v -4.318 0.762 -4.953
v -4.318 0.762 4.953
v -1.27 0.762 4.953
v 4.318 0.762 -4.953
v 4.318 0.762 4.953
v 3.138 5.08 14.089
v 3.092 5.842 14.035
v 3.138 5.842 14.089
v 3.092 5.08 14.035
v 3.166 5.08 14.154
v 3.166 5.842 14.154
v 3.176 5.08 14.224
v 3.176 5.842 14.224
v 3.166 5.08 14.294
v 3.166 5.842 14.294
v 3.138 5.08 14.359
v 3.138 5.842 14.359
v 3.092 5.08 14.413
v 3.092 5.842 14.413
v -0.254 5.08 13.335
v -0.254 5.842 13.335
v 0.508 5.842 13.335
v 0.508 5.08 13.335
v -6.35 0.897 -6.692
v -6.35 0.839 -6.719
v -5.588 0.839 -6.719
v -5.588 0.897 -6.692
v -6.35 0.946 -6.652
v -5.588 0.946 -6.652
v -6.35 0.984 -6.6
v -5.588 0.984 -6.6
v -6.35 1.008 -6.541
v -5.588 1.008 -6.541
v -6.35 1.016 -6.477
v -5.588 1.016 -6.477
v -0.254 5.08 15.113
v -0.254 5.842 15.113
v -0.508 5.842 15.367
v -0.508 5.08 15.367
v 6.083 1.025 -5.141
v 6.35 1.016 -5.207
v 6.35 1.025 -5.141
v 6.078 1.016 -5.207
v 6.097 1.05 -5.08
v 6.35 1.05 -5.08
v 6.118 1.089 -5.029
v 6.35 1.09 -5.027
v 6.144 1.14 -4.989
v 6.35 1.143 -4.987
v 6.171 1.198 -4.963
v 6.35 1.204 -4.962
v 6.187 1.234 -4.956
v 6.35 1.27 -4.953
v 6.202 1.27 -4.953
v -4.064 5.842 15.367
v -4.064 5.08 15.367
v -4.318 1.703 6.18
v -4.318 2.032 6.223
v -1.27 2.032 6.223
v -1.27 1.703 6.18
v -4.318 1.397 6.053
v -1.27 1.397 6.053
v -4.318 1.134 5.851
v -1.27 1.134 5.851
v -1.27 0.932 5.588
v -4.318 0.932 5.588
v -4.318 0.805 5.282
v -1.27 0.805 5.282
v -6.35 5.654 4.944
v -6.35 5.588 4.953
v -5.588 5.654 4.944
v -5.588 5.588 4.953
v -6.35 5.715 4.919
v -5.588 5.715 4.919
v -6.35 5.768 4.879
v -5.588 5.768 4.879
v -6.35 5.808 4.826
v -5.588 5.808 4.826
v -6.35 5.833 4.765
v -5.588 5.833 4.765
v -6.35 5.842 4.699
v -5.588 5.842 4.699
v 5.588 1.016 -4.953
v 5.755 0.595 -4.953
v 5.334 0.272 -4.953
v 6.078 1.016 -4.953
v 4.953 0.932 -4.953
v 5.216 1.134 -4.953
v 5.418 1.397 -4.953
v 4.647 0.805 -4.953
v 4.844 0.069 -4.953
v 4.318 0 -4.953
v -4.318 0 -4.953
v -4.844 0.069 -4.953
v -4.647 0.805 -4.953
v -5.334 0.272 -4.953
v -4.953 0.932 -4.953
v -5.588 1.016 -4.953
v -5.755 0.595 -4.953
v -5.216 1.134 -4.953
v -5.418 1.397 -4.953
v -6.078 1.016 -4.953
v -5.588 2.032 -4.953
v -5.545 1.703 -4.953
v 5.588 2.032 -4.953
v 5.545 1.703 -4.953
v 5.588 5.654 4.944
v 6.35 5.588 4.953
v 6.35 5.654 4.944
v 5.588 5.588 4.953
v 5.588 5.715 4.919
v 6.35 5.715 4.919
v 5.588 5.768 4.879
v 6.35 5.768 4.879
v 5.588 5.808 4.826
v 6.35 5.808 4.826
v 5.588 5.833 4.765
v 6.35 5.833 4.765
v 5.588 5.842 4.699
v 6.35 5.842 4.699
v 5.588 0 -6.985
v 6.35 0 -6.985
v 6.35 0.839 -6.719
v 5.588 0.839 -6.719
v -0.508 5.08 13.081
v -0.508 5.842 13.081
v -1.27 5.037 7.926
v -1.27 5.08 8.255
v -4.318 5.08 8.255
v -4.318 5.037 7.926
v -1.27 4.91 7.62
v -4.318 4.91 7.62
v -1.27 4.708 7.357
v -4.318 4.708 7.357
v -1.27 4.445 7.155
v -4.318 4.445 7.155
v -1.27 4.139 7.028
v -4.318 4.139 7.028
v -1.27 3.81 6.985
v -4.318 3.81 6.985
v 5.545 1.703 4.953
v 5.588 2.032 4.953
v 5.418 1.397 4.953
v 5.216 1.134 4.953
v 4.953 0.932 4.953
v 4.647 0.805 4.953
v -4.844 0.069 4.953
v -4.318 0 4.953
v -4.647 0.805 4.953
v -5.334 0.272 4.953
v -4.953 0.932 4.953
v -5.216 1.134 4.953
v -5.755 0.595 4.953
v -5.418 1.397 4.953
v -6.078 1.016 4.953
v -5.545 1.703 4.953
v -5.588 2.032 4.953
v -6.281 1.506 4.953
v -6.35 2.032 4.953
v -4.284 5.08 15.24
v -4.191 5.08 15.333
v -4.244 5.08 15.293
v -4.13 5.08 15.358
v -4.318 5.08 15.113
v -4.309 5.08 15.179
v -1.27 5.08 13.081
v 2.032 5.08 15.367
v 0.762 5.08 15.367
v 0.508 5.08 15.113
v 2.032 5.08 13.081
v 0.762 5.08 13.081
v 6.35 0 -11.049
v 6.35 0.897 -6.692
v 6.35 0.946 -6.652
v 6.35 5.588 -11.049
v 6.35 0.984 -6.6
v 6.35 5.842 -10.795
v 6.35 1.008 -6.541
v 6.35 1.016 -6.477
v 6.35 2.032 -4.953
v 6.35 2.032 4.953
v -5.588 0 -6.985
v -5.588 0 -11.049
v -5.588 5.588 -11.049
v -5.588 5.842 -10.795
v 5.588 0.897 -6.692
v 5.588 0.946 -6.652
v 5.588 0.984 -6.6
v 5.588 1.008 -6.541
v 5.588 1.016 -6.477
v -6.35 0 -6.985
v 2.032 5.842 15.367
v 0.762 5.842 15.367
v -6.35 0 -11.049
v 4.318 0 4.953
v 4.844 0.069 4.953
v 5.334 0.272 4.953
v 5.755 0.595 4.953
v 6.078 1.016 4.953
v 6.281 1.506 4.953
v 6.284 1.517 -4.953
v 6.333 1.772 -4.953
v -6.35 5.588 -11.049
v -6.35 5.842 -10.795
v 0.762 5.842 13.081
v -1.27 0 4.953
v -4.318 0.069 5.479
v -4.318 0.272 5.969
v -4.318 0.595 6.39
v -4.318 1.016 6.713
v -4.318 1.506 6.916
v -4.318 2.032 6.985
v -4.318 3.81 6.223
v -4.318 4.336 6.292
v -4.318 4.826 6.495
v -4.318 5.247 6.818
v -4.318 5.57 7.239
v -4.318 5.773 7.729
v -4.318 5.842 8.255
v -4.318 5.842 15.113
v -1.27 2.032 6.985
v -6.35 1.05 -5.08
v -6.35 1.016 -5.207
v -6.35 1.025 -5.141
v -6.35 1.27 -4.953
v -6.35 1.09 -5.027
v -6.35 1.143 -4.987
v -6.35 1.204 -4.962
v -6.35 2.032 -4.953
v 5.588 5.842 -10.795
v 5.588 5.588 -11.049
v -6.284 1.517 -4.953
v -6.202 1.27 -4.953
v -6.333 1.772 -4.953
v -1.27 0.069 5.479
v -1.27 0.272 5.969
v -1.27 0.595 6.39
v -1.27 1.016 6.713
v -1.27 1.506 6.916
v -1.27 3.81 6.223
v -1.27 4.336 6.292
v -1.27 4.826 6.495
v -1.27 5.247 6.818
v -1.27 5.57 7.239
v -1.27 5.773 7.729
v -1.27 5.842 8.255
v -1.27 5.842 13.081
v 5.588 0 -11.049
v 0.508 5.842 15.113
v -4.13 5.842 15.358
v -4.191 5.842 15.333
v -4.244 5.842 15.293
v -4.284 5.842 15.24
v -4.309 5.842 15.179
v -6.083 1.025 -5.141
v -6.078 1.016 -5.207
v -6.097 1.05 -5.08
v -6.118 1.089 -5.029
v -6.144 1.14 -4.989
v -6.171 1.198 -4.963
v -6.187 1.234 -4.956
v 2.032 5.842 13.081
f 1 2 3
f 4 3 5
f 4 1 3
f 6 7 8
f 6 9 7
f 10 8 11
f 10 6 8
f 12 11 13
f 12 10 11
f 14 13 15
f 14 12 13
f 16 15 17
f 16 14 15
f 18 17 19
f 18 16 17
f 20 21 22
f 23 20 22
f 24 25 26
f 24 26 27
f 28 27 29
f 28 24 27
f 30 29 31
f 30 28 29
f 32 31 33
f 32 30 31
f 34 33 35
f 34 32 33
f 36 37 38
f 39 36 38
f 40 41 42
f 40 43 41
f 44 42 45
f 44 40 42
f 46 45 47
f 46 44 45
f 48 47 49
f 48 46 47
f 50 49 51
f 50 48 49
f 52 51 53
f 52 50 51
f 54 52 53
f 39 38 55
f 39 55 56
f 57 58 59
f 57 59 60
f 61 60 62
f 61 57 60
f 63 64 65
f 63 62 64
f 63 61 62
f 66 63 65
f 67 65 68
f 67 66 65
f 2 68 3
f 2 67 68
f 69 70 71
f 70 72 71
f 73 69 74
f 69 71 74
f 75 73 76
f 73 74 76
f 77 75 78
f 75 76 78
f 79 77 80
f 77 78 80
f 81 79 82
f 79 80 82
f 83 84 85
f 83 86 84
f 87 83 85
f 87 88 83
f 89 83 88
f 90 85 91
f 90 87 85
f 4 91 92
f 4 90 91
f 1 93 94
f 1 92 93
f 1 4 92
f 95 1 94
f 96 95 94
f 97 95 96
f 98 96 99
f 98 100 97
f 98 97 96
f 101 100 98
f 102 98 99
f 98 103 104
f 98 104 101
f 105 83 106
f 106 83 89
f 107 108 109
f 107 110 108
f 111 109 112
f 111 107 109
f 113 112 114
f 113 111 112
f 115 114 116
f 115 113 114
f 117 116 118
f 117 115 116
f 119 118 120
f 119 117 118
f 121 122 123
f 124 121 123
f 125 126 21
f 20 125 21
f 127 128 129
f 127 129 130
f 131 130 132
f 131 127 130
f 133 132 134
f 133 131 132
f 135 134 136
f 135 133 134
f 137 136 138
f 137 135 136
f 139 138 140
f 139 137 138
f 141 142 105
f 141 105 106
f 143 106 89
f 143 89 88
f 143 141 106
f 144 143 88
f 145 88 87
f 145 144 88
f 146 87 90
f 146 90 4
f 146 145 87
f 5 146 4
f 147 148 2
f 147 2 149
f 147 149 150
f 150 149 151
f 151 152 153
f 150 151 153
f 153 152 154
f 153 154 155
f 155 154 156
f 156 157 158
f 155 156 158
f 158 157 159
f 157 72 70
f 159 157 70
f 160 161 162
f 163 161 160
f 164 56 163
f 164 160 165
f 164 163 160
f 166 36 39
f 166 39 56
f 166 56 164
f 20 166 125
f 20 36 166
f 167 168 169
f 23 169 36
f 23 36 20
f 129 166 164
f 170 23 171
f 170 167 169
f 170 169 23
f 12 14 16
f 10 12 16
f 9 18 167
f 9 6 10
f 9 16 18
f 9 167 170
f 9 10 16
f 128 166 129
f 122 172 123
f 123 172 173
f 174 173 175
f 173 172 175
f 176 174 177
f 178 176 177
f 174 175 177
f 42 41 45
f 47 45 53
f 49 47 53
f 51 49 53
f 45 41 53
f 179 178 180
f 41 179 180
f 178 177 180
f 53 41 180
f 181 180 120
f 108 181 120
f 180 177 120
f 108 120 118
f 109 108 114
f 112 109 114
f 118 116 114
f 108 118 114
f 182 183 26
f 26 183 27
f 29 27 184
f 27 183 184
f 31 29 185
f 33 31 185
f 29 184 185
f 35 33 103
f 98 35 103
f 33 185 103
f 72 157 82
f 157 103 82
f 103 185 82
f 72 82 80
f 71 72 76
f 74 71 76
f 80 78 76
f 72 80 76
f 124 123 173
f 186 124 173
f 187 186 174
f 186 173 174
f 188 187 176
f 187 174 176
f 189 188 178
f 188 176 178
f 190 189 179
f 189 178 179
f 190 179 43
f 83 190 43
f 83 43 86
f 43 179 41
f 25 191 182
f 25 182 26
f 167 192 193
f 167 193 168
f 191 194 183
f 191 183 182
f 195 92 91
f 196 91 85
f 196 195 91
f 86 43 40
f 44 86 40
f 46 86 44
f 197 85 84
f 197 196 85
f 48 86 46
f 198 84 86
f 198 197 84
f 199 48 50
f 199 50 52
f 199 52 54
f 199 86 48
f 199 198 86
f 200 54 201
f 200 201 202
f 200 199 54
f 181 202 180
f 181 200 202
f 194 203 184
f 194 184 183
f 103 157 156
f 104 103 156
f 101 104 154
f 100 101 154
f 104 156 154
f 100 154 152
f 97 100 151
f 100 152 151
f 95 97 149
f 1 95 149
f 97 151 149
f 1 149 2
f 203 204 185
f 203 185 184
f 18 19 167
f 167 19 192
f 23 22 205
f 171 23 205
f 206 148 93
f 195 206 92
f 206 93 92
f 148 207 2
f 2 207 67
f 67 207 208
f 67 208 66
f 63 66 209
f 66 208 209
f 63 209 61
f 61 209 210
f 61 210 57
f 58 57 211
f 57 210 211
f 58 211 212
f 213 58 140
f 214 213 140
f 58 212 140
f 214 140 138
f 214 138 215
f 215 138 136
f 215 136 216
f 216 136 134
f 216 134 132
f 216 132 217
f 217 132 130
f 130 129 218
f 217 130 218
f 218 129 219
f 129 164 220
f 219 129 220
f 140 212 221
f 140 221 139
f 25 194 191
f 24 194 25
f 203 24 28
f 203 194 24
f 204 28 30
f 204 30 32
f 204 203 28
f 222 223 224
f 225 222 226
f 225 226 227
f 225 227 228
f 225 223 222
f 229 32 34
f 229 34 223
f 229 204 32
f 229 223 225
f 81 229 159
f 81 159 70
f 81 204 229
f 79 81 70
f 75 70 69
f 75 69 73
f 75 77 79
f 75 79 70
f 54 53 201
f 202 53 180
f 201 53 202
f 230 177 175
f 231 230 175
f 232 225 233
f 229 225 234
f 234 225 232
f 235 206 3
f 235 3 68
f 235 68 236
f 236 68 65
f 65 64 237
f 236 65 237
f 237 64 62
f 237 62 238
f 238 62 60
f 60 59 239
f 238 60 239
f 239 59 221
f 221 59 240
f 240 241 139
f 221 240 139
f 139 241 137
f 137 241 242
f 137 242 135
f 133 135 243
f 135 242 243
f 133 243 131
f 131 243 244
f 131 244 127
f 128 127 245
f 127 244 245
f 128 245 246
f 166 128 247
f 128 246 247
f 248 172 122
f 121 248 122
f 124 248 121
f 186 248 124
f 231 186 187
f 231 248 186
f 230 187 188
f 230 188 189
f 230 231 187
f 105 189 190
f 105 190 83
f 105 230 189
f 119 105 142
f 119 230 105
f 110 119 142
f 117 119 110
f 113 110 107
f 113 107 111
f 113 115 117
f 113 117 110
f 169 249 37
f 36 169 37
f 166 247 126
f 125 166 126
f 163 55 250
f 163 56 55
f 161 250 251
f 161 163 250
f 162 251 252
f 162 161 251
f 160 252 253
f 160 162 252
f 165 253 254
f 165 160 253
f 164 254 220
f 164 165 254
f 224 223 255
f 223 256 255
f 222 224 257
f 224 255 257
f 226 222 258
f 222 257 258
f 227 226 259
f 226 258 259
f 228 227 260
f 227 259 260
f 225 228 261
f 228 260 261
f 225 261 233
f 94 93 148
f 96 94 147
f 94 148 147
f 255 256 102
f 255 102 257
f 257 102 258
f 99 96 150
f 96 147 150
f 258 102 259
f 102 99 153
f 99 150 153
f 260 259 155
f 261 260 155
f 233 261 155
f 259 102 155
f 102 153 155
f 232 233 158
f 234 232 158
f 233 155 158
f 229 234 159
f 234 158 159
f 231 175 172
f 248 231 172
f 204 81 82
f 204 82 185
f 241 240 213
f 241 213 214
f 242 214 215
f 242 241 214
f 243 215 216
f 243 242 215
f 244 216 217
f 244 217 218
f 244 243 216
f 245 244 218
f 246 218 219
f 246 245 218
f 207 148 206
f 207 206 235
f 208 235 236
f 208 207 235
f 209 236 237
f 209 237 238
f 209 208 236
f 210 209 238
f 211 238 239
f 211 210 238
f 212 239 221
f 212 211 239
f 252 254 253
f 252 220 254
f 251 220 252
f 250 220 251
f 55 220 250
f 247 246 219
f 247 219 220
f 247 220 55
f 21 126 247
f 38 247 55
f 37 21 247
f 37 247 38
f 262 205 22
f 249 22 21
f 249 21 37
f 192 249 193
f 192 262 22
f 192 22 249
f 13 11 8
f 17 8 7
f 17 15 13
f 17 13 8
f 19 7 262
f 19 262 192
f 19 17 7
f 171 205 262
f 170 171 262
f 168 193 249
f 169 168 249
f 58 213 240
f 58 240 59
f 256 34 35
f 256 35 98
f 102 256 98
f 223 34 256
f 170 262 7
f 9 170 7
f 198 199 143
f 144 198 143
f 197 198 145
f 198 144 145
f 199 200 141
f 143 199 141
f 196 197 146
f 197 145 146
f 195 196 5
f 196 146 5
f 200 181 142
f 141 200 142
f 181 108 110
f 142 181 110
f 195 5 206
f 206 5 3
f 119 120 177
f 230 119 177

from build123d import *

# Parameters (mm, degrees)
SKETCH1_W                    = 12.7
SKETCH1_H                    = 9.906
BOSS_EXTRUDE1_DEPTH          = 0.762
EDGE_FLANGE1_STRIP_W         = 5.588
EDGE_FLANGE1_STRIP_H         = 0.762
EDGE_FLANGE1_STRIP_CUT_DEPTH = 9.906
EDGE_FLANGE1_DEPTH           = 9.906
TAB1_DEPTH                   = 0.762
EDGE_FLANGE2_DEPTH           = 8.636
EDGE_FLANGE3_STRIP_W         = 5.588
EDGE_FLANGE3_STRIP_H         = 0.762
EDGE_FLANGE3_STRIP_CUT_DEPTH = 8.636
EDGE_FLANGE3_DEPTH           = 8.636
CUT_EXTRUDE1_DEPTH           = 18.623738338
FILLET1_R                    = 0.254
FILLET2_R                    = 0.254
FILLET3_R                    = 0.254


# Sheet-metal steps are written as plain solids
with BuildPart() as part:
    # Sketch1 → Boss-Extrude1 (new body)
    with BuildSketch(Plane(origin=(0, 0, 0), x_dir=(1, 0, 0), z_dir=(0, 1, 0))):
        Rectangle(SKETCH1_W, SKETCH1_H)
    extrude(amount=BOSS_EXTRUDE1_DEPTH)

    # Edge-Flange1 strip (across the edge) → Edge-Flange1 strip cut (cut)
    with BuildSketch(Plane(origin=(6.35, 0.762, 4.953), x_dir=(-1, 0, 0), z_dir=(0, 0, -1))):
        with Locations((-0.762, -0.381)):
            Rectangle(EDGE_FLANGE1_STRIP_W, EDGE_FLANGE1_STRIP_H)
    edge_flange1_strip_cut = extrude(amount=EDGE_FLANGE1_STRIP_CUT_DEPTH, mode=Mode.SUBTRACT)

    # Edge-Flange1 section (across the edge) → Edge-Flange1 (add)
    with BuildSketch(Plane(origin=(6.35, 0.762, 4.953), x_dir=(-1, 0, 0), z_dir=(0, 0, -1))):
        with BuildLine():
            Line((0, 1.27), (0, 5.08))
            Line((0, 5.08), (0.762, 5.08))
            Line((0.762, 5.08), (0.762, 1.27))
            ThreePointArc((0.762, 1.27), (1.133974388, 0.371974388), (2.032, 0))
            Line((2.032, 0), (2.032, -0.762))
            ThreePointArc((2.032, -0.762), (0.595159021, -0.166840979), (0, 1.27))
        make_face()
    edge_flange1 = extrude(amount=EDGE_FLANGE1_DEPTH)

    # Sketch10 → Tab1 (add)
    with BuildSketch(Plane(origin=(6.35, 0, 0), x_dir=(0, 0, -1), z_dir=(1, 0, 0))):
        with BuildLine():
            Line((4.953, 5.842), (10.795, 5.842))
            Line((10.795, 5.842), (11.049, 5.588))
            Line((11.049, 5.588), (11.049, 0))
            Line((11.049, 0), (6.985, 0))
            Line((6.985, 0), (6.719126572, 0.838751048))
            ThreePointArc((6.719126572, 0.838751048), (6.627035386, 0.966952148), (6.477, 1.016))
            Line((6.477, 1.016), (4.953, 1.016))
            Line((4.953, 1.016), (4.953, 5.842))
        make_face()
    tab1 = extrude(amount=-TAB1_DEPTH)

    # Mirror1: Edge-Flange1 strip cut, Edge-Flange1, Tab1 across plane
    add(edge_flange1_strip_cut.mirror(Plane(origin=(0, 0, 0), x_dir=(0, 0, 1), z_dir=(1, 0, 0))), mode=Mode.SUBTRACT)
    add(edge_flange1.mirror(Plane(origin=(0, 0, 0), x_dir=(0, 0, 1), z_dir=(1, 0, 0))))
    add(tab1.mirror(Plane(origin=(0, 0, 0), x_dir=(0, 0, 1), z_dir=(1, 0, 0))))

    # Edge-Flange2 section (across the edge) → Edge-Flange2 (add)
    with BuildSketch(Plane(origin=(-4.318, 0.762, 6.223), x_dir=(0, 0, -1), z_dir=(1, 0, 0))):
        with BuildLine():
            Line((-0.762, 1.27), (-0.762, 5.08))
            Line((-0.762, 5.08), (0, 5.08))
            Line((0, 5.08), (0, 1.27))
            ThreePointArc((0, 1.27), (0.371974388, 0.371974388), (1.27, 0))
            Line((1.27, 0), (1.27, -0.762))
            ThreePointArc((1.27, -0.762), (-0.166840979, -0.166840979), (-0.762, 1.27))
        make_face()
    extrude(amount=EDGE_FLANGE2_DEPTH)

    # Edge-Flange3 strip (across the edge) → Edge-Flange3 strip cut (cut)
    with BuildSketch(Plane(origin=(4.318, 5.842, 6.985), x_dir=(0, -1, 0), z_dir=(-1, 0, 0))):
        with Locations((-0.762, -0.381)):
            Rectangle(EDGE_FLANGE3_STRIP_W, EDGE_FLANGE3_STRIP_H)
    extrude(amount=EDGE_FLANGE3_STRIP_CUT_DEPTH, mode=Mode.SUBTRACT)

    # Edge-Flange3 section (across the edge) → Edge-Flange3 (add)
    with BuildSketch(Plane(origin=(4.318, 5.842, 6.985), x_dir=(0, -1, 0), z_dir=(-1, 0, 0))):
        with BuildLine():
            Line((0, 1.27), (0, 8.382))
            Line((0, 8.382), (0.762, 8.382))
            Line((0.762, 8.382), (0.762, 1.27))
            ThreePointArc((0.762, 1.27), (1.133974388, 0.371974388), (2.032, 0))
            Line((2.032, 0), (2.032, -0.762))
            ThreePointArc((2.032, -0.762), (0.595159021, -0.166840979), (0, 1.27))
        make_face()
    extrude(amount=EDGE_FLANGE3_DEPTH)

    # Sketch24 → Cut-Extrude1 (cut, through all)
    with BuildSketch(Plane(origin=(0, 5.842, 0), x_dir=(1, 0, 0), z_dir=(0, 1, 0))):
        Polygon((4.318, -4.953), (-1.27, -4.953), (-1.27, -13.081), (-0.508, -13.081), (-0.254, -13.335), (0.508, -13.335), (0.762, -13.081), (2.032, -13.081), (3.302, -14.224), (2.032, -15.367), (4.318, -15.367), align=None)
        Polygon((-0.508, -15.367), (0.762, -15.367), (0.508, -15.113), (-0.254, -15.113), align=None)
    extrude(amount=-CUT_EXTRUDE1_DEPTH, mode=Mode.SUBTRACT)

    # Fillet1
    fillet1_edges = [part.edges().sort_by_distance(p)[0] for p in [
        (-4.318, 5.461, 15.367),
        (3.302, 5.461, 14.224),
    ]]
    fillet(fillet1_edges, radius=FILLET1_R)

    # Fillet2
    fillet2_edges = [part.edges().sort_by_distance(p)[0] for p in [
        (5.969, 5.842, 4.953),
        (-5.969, 5.842, 4.953),
    ]]
    fillet(fillet2_edges, radius=FILLET2_R)

    # Fillet3
    fillet3_edges = [part.edges().sort_by_distance(p)[0] for p in [
        (-6.21388181, 1.016, -4.953),
        (6.21388181, 1.016, -4.953),
    ]]
    fillet(fillet3_edges, radius=FILLET3_R)


solid = part.part
